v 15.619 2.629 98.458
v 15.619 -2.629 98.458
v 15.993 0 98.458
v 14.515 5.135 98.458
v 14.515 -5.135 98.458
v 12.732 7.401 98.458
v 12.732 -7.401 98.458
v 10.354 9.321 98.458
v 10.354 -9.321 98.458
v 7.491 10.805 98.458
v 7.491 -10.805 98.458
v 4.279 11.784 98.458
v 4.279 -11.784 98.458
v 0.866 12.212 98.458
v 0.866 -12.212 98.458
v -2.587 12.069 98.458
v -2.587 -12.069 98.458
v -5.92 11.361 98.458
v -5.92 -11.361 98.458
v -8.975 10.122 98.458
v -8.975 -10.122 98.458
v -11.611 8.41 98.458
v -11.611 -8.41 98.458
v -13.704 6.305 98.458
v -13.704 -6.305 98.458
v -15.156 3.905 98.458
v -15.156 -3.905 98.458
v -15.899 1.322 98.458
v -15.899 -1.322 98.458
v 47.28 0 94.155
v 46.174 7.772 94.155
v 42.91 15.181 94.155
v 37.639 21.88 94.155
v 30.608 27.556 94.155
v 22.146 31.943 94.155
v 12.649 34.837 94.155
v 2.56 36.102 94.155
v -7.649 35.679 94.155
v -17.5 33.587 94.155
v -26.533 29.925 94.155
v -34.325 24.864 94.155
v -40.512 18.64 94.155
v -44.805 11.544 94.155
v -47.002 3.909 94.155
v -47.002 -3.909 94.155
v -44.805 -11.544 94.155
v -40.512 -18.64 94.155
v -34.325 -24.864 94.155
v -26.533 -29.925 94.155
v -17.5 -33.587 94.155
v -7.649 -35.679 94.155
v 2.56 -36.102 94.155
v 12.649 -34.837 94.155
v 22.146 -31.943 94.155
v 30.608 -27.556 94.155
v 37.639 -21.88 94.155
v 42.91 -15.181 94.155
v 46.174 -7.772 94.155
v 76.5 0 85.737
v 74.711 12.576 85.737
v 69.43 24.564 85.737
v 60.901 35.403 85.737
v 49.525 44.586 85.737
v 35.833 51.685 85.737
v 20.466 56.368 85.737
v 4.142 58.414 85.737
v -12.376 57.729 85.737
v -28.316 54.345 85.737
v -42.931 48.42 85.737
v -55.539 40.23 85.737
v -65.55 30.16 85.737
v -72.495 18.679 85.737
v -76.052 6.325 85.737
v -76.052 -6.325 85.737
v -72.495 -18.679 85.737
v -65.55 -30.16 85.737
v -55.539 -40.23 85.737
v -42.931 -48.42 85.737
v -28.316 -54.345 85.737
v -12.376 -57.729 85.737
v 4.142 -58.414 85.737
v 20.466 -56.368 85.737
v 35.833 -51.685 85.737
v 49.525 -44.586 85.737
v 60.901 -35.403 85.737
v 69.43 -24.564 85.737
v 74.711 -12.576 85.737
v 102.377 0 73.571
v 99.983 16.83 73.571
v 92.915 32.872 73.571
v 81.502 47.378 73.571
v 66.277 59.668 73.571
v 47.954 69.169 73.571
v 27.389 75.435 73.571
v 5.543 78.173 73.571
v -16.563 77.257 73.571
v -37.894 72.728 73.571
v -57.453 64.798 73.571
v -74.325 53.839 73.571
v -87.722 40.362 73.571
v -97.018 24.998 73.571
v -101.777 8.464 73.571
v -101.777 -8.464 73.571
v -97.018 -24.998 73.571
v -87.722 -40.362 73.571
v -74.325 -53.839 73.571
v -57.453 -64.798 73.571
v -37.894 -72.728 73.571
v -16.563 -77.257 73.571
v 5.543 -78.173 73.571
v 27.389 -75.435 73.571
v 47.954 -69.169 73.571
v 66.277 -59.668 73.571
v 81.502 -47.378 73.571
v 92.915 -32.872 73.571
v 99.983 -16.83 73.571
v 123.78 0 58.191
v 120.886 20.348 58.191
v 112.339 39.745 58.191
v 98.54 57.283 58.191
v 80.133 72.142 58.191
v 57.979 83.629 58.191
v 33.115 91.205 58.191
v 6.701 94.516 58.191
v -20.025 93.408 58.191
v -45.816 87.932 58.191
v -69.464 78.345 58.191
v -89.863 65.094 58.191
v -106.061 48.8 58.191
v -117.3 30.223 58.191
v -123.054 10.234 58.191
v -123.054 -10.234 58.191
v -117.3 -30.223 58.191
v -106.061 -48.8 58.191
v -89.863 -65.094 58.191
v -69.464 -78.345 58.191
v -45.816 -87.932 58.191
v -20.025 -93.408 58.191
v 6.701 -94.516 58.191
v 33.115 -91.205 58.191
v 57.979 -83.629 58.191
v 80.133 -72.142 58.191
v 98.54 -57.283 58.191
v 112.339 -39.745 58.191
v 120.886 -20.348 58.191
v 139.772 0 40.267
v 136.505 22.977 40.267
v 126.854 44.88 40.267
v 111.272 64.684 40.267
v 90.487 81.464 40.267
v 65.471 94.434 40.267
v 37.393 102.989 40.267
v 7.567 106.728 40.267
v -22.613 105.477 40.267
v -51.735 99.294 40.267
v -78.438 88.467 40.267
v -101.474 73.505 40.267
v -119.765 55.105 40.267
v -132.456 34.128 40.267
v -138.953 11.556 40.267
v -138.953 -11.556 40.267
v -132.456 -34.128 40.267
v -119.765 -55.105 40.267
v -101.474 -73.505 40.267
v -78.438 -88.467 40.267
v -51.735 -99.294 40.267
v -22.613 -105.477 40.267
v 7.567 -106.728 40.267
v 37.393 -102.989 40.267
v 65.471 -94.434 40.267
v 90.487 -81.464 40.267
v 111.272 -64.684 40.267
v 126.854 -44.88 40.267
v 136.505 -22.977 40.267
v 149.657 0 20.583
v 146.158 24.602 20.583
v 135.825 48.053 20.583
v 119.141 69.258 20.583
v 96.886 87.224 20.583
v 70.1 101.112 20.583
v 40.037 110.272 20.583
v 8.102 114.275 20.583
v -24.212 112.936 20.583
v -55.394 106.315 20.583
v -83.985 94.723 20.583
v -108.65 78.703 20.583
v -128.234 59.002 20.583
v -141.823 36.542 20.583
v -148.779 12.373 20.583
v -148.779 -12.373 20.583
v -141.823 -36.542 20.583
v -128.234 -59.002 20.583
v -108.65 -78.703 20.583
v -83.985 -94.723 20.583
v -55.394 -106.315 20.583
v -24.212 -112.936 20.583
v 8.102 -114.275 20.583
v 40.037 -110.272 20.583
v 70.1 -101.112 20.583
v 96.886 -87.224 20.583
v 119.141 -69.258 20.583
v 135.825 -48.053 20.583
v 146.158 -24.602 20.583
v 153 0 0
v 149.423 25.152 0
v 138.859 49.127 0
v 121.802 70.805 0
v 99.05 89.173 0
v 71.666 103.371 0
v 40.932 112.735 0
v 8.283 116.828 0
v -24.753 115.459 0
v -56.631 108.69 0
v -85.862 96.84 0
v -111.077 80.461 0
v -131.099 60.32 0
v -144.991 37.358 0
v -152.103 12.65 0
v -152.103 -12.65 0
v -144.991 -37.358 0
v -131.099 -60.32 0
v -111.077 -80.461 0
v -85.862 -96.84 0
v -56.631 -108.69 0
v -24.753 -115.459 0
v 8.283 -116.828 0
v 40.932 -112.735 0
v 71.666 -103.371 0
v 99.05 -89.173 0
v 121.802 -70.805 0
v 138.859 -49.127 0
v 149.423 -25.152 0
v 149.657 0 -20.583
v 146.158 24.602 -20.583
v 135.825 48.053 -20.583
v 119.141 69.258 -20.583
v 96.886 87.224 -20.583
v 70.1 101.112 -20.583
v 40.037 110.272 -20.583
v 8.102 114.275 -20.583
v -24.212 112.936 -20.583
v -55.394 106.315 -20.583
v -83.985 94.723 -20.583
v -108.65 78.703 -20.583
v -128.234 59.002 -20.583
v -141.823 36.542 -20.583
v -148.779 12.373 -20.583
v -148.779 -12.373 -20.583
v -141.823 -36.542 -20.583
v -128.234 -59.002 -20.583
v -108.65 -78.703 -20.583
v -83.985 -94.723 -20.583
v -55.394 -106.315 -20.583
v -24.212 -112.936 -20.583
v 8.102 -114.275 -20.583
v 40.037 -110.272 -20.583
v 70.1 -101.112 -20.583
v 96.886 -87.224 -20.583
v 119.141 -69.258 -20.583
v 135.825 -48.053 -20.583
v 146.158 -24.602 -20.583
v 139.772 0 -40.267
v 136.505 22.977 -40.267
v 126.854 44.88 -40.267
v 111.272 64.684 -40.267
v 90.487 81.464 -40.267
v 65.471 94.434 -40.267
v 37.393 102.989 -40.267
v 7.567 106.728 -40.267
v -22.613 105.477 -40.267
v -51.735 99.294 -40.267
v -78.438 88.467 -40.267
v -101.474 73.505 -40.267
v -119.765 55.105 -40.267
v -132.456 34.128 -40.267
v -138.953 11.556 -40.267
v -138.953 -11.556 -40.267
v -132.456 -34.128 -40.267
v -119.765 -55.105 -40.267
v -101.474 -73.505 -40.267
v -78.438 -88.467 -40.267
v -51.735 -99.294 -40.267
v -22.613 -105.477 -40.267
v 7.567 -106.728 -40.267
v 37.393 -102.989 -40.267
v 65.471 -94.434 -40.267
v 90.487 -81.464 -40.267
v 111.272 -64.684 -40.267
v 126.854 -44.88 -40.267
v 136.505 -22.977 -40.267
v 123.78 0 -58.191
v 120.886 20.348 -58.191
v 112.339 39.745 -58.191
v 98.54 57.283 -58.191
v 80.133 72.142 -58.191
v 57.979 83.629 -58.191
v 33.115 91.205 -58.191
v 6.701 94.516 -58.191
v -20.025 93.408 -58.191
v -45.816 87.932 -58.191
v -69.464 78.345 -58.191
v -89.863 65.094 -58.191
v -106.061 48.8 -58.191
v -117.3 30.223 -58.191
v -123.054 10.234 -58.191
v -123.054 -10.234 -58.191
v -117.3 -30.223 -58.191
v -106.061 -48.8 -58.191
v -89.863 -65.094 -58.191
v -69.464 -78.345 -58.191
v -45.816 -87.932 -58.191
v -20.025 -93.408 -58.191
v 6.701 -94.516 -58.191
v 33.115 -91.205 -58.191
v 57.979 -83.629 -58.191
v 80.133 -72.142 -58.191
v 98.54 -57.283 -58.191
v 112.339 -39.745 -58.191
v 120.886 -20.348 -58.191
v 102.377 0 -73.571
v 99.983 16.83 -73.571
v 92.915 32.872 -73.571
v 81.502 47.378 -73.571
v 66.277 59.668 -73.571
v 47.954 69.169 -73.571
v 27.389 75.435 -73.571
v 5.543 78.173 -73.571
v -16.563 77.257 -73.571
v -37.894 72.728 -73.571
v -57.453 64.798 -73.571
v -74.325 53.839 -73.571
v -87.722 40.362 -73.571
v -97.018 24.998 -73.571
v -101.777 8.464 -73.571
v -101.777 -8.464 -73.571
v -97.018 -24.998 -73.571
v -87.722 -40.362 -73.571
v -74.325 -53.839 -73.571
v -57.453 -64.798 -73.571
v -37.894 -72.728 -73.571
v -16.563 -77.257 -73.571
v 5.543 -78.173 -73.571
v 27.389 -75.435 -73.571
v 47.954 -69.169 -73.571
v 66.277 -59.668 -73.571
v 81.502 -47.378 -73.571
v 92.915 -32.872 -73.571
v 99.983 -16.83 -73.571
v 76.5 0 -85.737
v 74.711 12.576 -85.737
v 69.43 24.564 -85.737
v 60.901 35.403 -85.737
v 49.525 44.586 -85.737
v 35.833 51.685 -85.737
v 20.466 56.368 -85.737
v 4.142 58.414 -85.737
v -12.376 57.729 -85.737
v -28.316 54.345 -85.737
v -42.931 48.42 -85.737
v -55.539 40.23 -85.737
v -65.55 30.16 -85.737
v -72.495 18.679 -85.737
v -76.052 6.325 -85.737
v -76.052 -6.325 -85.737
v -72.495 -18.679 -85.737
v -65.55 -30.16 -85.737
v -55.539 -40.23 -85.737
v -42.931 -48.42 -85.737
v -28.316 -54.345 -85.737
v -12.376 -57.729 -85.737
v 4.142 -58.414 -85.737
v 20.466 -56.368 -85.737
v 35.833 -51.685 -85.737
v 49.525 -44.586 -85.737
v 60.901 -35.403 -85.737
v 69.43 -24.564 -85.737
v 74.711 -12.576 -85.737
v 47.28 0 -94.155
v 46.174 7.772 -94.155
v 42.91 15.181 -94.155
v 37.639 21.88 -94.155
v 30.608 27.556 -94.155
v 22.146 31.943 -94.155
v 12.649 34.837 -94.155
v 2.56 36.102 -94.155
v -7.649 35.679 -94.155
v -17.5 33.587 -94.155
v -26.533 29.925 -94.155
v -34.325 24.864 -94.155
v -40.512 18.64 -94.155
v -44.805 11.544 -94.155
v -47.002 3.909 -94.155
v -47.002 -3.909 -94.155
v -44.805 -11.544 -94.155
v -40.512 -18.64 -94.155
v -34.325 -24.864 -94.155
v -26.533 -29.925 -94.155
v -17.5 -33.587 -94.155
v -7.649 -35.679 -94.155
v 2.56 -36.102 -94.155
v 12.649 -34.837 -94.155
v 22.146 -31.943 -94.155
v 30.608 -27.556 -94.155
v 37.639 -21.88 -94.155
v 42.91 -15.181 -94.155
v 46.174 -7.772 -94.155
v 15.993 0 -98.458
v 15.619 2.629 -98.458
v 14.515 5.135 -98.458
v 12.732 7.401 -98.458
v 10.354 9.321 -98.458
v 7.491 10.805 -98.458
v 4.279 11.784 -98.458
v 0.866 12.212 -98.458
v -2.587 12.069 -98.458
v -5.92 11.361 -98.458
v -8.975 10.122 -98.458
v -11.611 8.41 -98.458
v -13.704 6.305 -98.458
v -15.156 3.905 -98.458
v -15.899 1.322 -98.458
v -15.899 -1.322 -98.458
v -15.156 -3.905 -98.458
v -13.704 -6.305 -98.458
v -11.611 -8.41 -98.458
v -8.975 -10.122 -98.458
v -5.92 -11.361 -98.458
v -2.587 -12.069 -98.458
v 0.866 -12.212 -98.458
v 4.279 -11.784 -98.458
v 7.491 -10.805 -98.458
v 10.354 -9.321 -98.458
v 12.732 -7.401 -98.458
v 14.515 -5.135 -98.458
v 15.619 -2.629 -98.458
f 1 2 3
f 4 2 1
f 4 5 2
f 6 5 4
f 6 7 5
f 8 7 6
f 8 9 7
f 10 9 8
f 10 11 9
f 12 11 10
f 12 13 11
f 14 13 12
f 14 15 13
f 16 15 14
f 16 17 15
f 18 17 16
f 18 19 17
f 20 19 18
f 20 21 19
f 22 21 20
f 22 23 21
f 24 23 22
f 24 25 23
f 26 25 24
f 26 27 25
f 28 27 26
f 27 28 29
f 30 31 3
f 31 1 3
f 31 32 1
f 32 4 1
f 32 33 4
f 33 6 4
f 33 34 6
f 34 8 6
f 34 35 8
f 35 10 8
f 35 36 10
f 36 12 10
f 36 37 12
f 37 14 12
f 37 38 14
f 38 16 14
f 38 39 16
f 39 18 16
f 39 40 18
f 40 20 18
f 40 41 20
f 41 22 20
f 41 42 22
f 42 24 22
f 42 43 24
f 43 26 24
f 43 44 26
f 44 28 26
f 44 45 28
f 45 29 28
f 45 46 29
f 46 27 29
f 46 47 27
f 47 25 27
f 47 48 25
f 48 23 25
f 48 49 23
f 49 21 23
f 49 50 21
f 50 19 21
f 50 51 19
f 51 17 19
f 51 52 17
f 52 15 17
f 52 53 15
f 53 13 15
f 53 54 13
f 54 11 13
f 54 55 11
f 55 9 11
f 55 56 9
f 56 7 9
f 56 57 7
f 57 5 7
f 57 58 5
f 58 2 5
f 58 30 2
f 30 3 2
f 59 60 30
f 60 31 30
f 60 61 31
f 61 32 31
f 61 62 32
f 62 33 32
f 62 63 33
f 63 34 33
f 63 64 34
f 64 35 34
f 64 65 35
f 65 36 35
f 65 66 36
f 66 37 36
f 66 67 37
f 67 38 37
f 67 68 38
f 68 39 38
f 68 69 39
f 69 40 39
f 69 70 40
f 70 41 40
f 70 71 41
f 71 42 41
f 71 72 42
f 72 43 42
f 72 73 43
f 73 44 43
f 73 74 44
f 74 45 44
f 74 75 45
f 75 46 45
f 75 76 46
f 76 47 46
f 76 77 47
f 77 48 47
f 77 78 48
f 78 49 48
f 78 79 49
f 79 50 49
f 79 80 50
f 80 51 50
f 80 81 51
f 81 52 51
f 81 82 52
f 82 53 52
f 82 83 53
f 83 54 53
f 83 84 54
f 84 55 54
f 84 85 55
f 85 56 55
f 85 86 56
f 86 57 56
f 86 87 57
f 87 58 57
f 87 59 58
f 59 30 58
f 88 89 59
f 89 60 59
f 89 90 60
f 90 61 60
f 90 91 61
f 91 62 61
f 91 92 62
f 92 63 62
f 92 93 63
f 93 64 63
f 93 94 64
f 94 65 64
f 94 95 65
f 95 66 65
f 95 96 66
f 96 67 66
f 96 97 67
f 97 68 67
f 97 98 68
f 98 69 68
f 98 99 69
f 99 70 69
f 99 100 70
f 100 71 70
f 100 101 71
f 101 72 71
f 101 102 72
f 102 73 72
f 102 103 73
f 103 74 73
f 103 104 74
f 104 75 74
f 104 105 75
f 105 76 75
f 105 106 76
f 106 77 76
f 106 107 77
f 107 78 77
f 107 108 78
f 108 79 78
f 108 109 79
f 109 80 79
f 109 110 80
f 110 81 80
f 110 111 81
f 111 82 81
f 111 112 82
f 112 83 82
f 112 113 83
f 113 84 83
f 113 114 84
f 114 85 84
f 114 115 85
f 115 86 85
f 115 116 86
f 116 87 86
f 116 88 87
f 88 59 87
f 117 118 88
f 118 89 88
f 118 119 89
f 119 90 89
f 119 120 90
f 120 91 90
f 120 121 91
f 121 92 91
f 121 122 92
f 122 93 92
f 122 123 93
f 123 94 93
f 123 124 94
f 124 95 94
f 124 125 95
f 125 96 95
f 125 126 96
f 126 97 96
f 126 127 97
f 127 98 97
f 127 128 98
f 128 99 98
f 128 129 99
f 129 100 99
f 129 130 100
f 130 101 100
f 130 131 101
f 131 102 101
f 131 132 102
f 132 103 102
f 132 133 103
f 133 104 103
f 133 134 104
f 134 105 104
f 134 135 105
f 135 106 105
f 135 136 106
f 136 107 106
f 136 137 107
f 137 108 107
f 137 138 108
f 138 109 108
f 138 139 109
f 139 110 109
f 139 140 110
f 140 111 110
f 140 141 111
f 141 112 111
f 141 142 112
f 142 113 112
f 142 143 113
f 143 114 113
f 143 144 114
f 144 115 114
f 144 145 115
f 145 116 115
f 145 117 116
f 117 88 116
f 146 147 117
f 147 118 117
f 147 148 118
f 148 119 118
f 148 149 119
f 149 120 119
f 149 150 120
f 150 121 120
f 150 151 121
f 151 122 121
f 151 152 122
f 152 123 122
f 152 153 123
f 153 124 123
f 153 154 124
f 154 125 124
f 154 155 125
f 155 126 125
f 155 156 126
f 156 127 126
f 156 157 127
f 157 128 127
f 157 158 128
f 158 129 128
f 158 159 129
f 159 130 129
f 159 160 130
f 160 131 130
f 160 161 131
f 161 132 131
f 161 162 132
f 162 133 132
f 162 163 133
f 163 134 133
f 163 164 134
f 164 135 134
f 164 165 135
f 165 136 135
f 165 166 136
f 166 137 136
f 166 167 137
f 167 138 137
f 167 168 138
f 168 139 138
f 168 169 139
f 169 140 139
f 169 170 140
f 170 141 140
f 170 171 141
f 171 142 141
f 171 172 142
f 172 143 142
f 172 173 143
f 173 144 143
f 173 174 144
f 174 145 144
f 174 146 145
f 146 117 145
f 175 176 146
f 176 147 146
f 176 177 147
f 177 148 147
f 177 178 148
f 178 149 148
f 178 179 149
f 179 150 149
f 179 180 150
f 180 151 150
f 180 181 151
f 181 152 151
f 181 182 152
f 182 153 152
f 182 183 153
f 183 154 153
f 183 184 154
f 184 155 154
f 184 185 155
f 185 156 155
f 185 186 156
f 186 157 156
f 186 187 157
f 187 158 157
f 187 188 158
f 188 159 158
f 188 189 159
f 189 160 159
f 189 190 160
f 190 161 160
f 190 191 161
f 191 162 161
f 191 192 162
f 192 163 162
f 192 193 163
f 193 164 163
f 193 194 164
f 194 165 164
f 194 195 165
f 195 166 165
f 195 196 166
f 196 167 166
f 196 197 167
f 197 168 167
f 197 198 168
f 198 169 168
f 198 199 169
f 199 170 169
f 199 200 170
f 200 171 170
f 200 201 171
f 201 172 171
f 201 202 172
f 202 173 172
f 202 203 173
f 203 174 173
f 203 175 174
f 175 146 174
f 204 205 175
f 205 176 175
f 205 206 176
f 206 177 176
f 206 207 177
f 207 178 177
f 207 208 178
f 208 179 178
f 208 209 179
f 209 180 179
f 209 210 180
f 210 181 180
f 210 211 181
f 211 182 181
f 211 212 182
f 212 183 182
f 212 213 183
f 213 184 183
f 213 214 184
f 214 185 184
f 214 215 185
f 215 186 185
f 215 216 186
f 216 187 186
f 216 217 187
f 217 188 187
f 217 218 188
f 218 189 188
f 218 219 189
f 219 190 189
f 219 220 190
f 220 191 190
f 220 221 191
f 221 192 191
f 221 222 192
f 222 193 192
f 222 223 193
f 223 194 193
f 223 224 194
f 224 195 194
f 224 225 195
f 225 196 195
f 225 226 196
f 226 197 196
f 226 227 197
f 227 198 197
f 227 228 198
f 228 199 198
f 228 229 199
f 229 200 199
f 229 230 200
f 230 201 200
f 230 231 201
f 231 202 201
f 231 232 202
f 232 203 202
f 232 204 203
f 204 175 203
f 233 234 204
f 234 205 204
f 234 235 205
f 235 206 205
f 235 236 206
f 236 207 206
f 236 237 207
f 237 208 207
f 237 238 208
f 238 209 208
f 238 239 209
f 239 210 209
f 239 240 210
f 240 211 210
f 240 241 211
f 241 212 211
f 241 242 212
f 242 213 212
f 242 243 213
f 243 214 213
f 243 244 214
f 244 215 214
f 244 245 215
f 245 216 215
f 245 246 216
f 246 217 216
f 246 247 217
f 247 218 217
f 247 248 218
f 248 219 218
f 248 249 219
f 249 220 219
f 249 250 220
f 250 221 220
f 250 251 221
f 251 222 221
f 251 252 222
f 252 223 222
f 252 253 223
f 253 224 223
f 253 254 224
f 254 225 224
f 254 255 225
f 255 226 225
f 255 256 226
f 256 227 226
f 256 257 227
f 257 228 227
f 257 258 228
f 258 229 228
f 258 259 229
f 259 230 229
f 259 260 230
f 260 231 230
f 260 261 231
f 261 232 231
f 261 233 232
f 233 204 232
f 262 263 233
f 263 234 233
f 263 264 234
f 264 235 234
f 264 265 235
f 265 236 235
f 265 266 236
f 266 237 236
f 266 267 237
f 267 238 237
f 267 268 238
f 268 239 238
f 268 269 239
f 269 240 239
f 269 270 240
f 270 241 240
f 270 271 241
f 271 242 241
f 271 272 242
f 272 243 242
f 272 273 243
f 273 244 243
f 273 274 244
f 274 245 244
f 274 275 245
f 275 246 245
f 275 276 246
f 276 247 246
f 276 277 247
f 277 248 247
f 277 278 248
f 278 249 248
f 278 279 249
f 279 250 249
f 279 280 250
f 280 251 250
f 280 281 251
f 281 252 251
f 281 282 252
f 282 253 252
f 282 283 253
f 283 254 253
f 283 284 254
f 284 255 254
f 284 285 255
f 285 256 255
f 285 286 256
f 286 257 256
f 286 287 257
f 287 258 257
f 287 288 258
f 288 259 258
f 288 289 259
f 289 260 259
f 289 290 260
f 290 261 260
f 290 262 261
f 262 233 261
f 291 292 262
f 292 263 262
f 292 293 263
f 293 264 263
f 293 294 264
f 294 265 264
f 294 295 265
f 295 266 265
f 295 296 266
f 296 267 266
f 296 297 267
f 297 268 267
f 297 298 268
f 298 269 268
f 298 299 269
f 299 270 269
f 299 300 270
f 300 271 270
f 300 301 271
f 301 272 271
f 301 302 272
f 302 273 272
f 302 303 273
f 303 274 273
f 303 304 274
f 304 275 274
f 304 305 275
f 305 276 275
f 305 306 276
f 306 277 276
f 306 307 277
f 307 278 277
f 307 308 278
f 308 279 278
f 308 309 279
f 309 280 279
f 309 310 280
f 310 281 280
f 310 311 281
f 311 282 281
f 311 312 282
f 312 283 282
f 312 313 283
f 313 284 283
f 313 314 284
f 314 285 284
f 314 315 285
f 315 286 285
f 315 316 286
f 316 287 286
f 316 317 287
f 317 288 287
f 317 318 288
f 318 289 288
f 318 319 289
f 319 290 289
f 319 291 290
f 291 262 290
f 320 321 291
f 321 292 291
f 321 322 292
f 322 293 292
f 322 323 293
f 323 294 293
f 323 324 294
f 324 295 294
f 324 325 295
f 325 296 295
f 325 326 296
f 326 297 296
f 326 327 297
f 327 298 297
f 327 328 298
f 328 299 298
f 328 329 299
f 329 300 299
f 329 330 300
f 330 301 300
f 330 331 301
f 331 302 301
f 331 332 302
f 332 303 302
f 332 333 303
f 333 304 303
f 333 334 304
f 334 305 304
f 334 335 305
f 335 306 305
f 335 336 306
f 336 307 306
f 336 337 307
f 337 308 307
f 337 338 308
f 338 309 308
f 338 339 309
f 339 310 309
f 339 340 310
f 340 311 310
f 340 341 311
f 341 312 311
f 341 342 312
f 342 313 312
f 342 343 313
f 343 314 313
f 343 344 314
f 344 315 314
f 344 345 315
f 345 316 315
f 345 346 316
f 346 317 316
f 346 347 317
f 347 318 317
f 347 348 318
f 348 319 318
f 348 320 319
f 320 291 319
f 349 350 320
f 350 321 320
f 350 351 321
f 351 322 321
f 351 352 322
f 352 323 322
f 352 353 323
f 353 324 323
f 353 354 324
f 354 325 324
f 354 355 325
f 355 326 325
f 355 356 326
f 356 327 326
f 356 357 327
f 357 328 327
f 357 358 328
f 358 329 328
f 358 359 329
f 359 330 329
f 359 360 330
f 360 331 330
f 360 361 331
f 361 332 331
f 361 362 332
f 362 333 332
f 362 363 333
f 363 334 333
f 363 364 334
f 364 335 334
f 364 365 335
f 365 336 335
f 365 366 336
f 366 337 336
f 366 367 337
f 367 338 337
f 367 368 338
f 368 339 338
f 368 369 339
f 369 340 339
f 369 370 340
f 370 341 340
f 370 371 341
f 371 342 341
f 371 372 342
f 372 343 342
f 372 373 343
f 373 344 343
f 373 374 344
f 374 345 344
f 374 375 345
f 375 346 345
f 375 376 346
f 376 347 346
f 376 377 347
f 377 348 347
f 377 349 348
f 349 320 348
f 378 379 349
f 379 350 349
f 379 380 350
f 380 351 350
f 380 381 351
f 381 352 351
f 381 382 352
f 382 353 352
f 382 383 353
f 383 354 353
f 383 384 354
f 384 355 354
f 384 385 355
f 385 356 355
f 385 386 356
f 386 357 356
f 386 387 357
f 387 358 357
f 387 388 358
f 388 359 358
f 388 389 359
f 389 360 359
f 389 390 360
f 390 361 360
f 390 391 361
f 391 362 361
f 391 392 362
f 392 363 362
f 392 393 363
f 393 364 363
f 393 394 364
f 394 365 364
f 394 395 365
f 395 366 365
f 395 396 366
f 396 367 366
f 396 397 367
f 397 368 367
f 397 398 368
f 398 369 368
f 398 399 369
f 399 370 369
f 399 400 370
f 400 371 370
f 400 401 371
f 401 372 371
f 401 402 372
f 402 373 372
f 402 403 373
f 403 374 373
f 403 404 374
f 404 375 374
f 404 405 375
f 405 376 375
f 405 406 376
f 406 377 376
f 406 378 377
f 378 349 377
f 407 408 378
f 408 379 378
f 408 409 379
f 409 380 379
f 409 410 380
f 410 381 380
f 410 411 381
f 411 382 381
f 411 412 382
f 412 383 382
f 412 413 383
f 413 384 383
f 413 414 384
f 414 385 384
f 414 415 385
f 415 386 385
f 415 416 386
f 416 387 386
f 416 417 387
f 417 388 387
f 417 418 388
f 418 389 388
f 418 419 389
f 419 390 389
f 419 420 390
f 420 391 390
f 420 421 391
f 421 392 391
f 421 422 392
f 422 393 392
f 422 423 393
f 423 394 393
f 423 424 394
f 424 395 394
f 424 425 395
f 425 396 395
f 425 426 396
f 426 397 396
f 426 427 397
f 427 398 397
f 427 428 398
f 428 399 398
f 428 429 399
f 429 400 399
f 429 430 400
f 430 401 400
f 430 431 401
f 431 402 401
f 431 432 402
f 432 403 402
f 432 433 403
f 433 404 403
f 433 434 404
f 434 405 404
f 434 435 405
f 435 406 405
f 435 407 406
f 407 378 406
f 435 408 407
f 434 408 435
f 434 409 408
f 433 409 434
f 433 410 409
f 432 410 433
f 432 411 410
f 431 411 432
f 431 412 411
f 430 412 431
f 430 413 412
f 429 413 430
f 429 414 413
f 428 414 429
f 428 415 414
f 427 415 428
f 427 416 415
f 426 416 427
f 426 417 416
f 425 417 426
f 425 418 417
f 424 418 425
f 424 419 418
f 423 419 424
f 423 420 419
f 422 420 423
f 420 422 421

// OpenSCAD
// Generated by SolidPython 1.0.1 on 2020-07-29 00:46:53


scale(v = [17, 13, 11]) {
	sphere(r = 9);
}
/***********************************************
*********      SolidPython code:      **********
************************************************
 
# import packages: SolidPython
from solid import *
from solid.utils import *
from itertools import chain, combinations, permutations


class Resize:

    def __init__(self, scad_file):
        self.scad_file = scad_file
        #self.scad_file = import_scad(scad_file)
        # cone/cylinder param:
        self.r1 = 0
        self.r2 = 0
        self.h = 0
        # rectangular prism param:
        self.w = 0
        self.l = 0
        # ellipse param:
        self.r = 0

    # import OpenScad code (file name corresponds to shape)


    # classify shape + parameters
    def assign(self, param1, param2, param3):
        if self.scad_file == 'cone.scad':
            self.r1 = param1
            self.r2 = param2
            self.h = param3
        elif self.scad_file == 'cylinder.scad':
            self.r1 = param1
            self.r2 = param2
            self.h = param3
        elif self.scad_file == 'rectangularPrism.scad':
            self.h = param1
            self.l = param2
            self.w = param3
        else:
            self.r = param1
            self.h = param2

    # resize parameters
    def iterate(self):
        x = range(3, 20, 2)
        i = 1
        if self.scad_file == 'cone.scad':
            tempList = list(permutations(x, 2))
            for temp in tempList:
                param1 = temp[0]
                param2 = temp[1]
                filepath = 'produced_scad_files/' + 'cone' + str(param1) + '_' + str(param2) + '_' + '.scad'
                scad_render_to_file(cylinder(h=param1, r1=param2, r2=0), filepath)

        elif self.scad_file == 'cylinder.scad':
            tempList = list(permutations(x, 3))
            for temp in tempList:
                param1 = temp[0]
                param2 = temp[1]
                filepath = 'produced_scad_files/' + 'cylinder' + str(param1) + '_' + str(param2) + '_' + '.scad'
                scad_render_to_file(cylinder(h=param1, r1=param2, r2=param2), filepath)

        elif self.scad_file == 'rectangularPrism.scad':
            tempList = list(permutations(x, 3))
            for temp in tempList:
                param1 = temp[0]
                param2 = temp[1]
                param3 = temp[2]
                filepath = 'produced_scad_files/' + 'rectangularPrism' + str(param1) + '_' + str(param2) + '_' + str(
                    param3) + '.scad'
                scad_render_to_file(cube(size=(param1, param2, param3)), filepath)

        elif self.scad_file == 'ellipse.scad':
            tempList = list(permutations(x, 4))
            for temp in tempList:
                param1 = temp[0]
                param2 = temp[1]
                param3 = temp[2]
                param4 = temp[3]
                filepath = 'produced_scad_files/' + 'ellipse' + str(param1) + '_' + str(param2) + '_' + str(param3) + '_' + str(param4) + '.scad'
                scad_render_to_file(scale([param1, param2, param3])(sphere(r=param4)), filepath)

    def render_to_scadfile(self):
        scad_render_to_file(scad, 'example.scad') 
 
************************************************/
